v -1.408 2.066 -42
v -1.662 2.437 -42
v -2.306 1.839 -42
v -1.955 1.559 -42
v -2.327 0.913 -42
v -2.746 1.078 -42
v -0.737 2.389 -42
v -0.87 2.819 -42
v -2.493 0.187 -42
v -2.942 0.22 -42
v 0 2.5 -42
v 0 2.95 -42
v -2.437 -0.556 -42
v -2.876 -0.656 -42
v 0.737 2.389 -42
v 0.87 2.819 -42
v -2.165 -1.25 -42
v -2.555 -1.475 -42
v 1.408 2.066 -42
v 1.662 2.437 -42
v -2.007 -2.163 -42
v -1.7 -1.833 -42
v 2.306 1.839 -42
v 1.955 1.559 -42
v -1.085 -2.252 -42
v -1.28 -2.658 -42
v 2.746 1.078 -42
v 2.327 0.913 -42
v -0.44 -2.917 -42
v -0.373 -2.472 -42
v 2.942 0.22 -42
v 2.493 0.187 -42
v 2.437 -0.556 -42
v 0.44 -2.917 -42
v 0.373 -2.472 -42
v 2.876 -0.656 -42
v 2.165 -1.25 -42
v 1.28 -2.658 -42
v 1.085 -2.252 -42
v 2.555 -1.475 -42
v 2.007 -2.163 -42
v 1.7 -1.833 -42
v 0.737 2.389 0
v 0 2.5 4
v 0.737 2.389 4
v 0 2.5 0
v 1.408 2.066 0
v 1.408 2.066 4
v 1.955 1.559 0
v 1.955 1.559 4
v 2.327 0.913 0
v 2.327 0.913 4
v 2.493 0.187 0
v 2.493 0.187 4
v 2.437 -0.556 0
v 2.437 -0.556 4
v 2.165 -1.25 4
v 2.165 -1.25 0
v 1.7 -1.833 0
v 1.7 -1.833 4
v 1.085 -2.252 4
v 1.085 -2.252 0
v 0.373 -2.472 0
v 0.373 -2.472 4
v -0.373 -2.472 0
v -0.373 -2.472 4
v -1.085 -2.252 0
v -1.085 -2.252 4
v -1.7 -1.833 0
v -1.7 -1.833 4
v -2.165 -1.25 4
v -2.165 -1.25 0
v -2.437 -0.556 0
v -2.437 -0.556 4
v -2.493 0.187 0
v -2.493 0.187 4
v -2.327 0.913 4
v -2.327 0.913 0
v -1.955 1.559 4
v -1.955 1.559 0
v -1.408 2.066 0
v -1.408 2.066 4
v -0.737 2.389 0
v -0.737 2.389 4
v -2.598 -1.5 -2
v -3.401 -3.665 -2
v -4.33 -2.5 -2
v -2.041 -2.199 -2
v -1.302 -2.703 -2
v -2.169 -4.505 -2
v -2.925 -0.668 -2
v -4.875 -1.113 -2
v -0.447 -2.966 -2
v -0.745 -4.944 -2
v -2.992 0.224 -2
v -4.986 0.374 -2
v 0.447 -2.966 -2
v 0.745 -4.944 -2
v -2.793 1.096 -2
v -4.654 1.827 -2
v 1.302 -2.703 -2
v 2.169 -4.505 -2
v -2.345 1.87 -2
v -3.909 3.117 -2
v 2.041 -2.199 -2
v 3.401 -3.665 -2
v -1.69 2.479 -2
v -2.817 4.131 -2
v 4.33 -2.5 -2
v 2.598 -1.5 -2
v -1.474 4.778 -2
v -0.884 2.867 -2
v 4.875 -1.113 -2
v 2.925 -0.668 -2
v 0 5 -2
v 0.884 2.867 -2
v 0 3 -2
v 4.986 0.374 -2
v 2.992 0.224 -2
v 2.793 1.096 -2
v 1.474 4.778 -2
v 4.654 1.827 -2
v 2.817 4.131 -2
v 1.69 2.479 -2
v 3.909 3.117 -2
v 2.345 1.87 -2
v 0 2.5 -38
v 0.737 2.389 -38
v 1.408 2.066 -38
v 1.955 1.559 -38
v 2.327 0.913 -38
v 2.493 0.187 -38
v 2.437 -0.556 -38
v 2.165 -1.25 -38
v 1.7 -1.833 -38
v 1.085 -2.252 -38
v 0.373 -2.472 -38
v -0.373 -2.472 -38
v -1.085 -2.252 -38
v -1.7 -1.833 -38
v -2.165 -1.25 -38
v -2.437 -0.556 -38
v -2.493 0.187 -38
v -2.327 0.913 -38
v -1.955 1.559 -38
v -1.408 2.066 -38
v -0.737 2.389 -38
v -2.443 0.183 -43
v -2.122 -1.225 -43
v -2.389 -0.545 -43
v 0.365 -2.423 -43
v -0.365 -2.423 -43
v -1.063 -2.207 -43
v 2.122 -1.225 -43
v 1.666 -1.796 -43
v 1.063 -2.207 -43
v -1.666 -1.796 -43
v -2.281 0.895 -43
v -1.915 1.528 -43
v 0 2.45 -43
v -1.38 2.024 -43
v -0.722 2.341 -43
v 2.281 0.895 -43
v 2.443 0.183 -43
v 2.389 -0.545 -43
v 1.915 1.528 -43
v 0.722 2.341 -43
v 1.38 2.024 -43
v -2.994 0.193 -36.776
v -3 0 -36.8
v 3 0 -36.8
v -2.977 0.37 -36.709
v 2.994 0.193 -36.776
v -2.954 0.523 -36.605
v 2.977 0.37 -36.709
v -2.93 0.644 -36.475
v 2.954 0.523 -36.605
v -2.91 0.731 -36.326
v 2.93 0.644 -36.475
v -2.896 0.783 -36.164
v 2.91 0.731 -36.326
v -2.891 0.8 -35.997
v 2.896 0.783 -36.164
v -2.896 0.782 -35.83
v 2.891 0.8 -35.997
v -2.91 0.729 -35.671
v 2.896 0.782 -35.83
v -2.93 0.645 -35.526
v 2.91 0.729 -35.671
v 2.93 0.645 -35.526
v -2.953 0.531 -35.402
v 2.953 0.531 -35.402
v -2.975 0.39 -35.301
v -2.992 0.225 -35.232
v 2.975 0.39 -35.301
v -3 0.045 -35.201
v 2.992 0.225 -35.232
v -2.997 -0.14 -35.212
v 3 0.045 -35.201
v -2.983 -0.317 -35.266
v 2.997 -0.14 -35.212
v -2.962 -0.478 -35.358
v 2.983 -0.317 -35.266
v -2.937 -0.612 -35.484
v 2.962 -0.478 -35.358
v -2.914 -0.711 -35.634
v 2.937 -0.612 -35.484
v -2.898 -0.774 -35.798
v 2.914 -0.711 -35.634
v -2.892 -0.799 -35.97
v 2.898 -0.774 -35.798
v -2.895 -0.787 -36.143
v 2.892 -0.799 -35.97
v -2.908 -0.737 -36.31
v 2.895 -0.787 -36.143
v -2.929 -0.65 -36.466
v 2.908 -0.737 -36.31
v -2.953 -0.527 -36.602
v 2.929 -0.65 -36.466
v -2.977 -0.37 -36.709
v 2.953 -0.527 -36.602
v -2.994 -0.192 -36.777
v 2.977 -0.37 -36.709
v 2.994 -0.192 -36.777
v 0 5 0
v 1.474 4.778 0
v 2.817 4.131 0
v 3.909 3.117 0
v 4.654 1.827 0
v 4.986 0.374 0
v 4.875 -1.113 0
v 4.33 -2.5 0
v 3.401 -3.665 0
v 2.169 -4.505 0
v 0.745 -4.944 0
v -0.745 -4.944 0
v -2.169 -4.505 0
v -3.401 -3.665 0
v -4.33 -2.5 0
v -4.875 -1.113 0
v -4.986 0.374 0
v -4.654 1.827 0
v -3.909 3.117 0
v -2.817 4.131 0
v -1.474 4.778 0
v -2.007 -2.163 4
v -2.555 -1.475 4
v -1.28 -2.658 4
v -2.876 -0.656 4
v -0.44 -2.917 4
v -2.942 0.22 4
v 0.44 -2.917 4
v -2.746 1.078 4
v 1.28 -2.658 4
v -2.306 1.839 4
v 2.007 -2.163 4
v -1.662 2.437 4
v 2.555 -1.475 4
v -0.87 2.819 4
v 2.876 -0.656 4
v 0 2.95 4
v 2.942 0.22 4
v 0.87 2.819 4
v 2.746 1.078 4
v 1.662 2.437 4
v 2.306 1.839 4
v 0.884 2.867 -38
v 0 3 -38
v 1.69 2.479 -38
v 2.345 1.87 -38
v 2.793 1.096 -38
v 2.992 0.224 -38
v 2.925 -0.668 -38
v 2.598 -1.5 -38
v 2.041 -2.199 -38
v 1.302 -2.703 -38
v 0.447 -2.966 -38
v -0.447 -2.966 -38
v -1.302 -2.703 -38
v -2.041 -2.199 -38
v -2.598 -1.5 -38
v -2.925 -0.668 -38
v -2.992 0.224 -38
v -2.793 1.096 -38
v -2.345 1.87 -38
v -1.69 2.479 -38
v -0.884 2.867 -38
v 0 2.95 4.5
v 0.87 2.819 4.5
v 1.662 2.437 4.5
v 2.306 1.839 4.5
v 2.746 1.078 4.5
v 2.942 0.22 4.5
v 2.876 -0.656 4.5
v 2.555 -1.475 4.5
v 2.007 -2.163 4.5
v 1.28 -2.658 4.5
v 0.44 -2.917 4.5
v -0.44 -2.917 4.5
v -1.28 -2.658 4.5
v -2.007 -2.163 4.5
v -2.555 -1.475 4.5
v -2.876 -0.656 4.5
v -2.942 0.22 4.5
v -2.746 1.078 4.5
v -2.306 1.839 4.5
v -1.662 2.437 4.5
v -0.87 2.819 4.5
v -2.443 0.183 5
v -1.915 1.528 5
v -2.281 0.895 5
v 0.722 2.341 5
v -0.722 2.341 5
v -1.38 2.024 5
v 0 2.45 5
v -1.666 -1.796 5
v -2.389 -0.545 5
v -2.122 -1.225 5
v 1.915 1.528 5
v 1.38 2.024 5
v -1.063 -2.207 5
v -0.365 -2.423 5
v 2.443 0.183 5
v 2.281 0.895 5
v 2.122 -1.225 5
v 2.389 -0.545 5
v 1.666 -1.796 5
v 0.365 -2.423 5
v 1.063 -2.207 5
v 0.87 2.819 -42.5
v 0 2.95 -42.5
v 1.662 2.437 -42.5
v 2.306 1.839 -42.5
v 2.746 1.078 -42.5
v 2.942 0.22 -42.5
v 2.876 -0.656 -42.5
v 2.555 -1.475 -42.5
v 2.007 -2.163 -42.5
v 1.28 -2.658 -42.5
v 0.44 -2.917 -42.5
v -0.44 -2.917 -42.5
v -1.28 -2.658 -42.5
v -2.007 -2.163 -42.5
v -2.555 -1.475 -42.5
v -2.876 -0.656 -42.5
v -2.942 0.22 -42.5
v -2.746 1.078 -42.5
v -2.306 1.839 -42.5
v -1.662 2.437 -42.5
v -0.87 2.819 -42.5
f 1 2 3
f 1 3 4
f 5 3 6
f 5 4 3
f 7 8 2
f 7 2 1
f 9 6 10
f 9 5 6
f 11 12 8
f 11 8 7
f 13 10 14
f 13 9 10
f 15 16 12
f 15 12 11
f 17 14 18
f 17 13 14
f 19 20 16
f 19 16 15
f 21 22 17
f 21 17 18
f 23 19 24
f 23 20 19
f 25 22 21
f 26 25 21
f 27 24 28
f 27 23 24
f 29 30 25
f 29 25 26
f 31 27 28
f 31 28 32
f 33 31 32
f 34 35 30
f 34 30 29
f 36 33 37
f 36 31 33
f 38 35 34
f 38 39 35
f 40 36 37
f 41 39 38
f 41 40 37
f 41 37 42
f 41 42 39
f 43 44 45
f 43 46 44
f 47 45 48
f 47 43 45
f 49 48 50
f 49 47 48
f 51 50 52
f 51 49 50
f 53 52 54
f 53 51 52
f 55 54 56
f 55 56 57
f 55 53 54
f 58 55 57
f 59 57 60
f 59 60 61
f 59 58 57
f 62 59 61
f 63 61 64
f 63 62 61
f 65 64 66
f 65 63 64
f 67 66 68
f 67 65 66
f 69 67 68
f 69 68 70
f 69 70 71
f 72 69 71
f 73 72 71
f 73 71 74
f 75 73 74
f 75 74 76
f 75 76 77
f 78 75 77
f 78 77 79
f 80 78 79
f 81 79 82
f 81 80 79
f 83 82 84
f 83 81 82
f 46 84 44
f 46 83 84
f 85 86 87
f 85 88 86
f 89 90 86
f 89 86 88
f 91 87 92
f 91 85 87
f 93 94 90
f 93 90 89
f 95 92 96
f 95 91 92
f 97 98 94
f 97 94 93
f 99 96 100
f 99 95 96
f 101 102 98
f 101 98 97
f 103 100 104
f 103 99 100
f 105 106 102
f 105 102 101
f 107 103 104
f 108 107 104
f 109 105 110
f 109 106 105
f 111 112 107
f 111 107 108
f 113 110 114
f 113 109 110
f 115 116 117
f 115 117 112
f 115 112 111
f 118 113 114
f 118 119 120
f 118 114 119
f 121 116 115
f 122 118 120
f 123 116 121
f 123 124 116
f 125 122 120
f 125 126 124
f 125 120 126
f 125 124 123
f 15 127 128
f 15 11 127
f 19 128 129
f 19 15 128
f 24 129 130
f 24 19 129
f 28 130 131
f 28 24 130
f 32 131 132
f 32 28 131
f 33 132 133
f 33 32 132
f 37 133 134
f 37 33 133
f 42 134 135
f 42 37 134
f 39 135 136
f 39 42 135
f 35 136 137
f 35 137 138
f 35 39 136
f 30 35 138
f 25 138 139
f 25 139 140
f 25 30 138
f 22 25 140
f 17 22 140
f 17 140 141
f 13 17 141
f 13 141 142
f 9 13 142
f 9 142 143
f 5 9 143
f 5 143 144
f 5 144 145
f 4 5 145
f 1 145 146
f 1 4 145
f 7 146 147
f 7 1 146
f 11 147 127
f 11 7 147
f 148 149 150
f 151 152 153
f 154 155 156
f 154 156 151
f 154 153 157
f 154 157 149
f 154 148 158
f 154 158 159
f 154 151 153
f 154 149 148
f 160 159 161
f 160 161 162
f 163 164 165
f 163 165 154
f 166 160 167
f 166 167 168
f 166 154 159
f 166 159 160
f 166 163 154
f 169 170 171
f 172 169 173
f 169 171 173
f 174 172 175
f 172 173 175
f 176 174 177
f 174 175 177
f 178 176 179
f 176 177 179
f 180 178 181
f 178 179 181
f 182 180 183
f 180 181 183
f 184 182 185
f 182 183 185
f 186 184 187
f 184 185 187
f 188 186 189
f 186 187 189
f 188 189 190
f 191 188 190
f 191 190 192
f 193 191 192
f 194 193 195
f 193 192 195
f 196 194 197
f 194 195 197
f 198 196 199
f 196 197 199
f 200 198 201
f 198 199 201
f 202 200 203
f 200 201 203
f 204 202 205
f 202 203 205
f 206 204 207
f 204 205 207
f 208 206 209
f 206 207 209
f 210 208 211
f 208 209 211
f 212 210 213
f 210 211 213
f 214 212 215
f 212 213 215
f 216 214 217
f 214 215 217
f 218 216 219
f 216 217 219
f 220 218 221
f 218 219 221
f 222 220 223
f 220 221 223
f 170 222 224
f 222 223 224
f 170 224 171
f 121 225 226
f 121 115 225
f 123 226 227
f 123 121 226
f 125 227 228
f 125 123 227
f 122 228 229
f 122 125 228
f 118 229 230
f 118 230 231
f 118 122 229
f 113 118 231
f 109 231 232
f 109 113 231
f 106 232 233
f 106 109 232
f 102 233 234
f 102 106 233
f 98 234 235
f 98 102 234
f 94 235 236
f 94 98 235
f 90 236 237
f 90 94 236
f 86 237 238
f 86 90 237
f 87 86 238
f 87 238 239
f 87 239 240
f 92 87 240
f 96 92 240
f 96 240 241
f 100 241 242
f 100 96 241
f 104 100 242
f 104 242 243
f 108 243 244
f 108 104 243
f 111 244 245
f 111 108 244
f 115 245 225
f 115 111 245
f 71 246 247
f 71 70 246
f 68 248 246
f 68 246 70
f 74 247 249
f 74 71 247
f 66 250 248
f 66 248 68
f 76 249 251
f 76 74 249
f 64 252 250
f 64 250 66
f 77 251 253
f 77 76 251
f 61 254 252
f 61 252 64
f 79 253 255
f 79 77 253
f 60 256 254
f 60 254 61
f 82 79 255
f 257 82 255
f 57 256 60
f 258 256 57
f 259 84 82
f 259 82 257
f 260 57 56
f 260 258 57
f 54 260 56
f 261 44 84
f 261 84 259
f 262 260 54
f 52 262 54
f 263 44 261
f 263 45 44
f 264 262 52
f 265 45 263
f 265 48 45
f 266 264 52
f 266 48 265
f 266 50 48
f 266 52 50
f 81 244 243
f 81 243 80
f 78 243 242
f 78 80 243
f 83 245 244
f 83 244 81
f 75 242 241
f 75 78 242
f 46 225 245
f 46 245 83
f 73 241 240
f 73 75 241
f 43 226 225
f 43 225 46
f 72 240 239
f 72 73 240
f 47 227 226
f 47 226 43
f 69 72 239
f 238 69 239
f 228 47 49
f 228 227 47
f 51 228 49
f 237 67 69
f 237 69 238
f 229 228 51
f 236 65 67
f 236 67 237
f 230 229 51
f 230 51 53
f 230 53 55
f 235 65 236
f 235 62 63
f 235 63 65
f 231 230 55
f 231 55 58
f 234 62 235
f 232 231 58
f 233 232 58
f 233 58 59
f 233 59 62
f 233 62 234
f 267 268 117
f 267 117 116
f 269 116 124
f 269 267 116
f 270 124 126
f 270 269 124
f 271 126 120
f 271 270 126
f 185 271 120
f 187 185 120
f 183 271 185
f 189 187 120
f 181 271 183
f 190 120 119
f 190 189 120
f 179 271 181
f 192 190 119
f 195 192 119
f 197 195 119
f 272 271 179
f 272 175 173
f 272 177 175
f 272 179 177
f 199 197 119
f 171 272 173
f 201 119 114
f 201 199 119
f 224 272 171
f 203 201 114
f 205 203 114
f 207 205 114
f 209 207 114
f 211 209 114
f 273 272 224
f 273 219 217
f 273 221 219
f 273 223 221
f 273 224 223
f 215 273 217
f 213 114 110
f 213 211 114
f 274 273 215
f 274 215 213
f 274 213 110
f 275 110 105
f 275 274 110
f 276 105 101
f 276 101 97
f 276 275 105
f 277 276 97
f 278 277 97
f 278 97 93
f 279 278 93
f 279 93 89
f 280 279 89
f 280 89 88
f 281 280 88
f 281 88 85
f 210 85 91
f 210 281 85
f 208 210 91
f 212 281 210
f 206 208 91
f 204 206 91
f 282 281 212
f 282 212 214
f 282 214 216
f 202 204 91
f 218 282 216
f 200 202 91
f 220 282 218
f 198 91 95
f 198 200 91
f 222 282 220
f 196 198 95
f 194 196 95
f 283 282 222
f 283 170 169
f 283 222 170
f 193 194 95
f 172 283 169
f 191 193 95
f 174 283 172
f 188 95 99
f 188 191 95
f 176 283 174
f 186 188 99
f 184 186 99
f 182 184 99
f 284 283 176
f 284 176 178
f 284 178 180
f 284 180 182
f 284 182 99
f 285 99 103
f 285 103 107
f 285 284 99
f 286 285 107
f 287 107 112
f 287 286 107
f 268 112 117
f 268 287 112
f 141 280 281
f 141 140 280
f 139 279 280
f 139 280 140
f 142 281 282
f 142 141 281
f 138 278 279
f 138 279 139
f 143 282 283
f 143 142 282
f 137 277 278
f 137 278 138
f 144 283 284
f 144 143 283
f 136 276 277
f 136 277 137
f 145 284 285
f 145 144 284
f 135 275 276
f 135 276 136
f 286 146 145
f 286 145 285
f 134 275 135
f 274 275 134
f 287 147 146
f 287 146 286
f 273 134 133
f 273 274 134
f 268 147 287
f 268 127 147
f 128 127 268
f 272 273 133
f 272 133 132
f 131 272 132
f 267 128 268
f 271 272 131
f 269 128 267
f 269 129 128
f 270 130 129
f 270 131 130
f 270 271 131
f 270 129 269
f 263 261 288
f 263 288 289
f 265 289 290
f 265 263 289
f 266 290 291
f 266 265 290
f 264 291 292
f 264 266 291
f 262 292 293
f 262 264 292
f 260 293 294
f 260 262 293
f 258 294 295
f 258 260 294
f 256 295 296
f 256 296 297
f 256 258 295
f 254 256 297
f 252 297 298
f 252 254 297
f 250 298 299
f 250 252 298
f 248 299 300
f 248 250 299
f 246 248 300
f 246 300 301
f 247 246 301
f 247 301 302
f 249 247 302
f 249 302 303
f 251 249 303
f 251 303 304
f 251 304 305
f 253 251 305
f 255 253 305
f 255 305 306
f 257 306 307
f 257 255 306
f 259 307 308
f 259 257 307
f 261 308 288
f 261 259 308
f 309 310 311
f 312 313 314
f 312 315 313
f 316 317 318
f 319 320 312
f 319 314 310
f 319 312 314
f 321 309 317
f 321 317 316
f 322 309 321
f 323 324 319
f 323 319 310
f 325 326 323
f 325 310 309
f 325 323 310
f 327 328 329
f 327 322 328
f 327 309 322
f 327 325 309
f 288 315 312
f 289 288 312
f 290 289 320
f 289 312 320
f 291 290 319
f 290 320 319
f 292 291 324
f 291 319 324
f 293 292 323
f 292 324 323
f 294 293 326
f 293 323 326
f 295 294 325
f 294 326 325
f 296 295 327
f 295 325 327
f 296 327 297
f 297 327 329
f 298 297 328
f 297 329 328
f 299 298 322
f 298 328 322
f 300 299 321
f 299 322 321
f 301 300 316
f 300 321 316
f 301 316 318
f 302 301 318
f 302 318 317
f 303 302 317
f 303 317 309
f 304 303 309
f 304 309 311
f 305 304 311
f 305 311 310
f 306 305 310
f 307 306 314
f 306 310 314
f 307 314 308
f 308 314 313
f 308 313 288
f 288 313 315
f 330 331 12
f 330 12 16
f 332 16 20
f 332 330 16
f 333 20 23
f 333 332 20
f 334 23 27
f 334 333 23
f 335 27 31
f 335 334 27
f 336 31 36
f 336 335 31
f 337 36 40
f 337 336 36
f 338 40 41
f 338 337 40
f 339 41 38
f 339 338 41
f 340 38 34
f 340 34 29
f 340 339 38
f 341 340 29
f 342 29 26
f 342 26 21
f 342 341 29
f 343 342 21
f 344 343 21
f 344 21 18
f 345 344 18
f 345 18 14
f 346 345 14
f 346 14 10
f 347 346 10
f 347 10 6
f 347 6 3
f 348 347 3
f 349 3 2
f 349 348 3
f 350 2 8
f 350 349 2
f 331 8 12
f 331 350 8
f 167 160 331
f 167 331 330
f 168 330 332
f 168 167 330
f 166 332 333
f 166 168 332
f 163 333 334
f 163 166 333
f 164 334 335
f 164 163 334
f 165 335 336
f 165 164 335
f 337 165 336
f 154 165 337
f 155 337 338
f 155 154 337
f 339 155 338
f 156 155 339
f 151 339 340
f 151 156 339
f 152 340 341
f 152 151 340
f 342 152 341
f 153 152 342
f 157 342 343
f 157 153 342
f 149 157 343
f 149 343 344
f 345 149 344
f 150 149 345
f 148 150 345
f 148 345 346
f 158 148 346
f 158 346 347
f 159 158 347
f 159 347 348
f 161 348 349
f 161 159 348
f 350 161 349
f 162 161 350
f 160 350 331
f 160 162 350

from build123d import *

# Parameters (mm, degrees)
SKETCH_2_R          = 0.8
CUT_EXTRUDE_1_DEPTH = 10
CHAMFER_1_SIZE      = 0.5


with BuildPart() as part:
    # Эскиз1 → Повернуть1 (revolve)
    with BuildSketch(Plane(origin=(0, 0, 0), x_dir=(0, 0, -1), z_dir=(1, 0, 0))):
        Polygon((0, 2.5), (0, 5), (2, 5), (2, 3), (38, 3), (38, 2.5), (42, 2.5), (42, 2.95), (43, 2.95), (43, 0), (0, 0), (-5, 0), (-5, 2.95), (-4, 2.95), (-4, 2.5), align=None)
    revolve(axis=Axis((0, 0, 0), (0, 0, -1)))

    # Эскиз2 → Вытянуть1 (cut, symmetric)
    with BuildSketch(Plane(origin=(0, 0, 0), x_dir=(0, 0, -1), z_dir=(1, 0, 0))):
        with Locations((36, 0)):
            Circle(SKETCH_2_R)
    extrude(amount=CUT_EXTRUDE_1_DEPTH, both=True, mode=Mode.SUBTRACT)

    # Фаска1
    chamfer_1_edges = [part.edges().sort_by_distance(p)[0] for p in [
        (0, -2.95, -43),
        (0, -2.95, 5),
    ]]
    chamfer(chamfer_1_edges, length=CHAMFER_1_SIZE)


solid = part.part
